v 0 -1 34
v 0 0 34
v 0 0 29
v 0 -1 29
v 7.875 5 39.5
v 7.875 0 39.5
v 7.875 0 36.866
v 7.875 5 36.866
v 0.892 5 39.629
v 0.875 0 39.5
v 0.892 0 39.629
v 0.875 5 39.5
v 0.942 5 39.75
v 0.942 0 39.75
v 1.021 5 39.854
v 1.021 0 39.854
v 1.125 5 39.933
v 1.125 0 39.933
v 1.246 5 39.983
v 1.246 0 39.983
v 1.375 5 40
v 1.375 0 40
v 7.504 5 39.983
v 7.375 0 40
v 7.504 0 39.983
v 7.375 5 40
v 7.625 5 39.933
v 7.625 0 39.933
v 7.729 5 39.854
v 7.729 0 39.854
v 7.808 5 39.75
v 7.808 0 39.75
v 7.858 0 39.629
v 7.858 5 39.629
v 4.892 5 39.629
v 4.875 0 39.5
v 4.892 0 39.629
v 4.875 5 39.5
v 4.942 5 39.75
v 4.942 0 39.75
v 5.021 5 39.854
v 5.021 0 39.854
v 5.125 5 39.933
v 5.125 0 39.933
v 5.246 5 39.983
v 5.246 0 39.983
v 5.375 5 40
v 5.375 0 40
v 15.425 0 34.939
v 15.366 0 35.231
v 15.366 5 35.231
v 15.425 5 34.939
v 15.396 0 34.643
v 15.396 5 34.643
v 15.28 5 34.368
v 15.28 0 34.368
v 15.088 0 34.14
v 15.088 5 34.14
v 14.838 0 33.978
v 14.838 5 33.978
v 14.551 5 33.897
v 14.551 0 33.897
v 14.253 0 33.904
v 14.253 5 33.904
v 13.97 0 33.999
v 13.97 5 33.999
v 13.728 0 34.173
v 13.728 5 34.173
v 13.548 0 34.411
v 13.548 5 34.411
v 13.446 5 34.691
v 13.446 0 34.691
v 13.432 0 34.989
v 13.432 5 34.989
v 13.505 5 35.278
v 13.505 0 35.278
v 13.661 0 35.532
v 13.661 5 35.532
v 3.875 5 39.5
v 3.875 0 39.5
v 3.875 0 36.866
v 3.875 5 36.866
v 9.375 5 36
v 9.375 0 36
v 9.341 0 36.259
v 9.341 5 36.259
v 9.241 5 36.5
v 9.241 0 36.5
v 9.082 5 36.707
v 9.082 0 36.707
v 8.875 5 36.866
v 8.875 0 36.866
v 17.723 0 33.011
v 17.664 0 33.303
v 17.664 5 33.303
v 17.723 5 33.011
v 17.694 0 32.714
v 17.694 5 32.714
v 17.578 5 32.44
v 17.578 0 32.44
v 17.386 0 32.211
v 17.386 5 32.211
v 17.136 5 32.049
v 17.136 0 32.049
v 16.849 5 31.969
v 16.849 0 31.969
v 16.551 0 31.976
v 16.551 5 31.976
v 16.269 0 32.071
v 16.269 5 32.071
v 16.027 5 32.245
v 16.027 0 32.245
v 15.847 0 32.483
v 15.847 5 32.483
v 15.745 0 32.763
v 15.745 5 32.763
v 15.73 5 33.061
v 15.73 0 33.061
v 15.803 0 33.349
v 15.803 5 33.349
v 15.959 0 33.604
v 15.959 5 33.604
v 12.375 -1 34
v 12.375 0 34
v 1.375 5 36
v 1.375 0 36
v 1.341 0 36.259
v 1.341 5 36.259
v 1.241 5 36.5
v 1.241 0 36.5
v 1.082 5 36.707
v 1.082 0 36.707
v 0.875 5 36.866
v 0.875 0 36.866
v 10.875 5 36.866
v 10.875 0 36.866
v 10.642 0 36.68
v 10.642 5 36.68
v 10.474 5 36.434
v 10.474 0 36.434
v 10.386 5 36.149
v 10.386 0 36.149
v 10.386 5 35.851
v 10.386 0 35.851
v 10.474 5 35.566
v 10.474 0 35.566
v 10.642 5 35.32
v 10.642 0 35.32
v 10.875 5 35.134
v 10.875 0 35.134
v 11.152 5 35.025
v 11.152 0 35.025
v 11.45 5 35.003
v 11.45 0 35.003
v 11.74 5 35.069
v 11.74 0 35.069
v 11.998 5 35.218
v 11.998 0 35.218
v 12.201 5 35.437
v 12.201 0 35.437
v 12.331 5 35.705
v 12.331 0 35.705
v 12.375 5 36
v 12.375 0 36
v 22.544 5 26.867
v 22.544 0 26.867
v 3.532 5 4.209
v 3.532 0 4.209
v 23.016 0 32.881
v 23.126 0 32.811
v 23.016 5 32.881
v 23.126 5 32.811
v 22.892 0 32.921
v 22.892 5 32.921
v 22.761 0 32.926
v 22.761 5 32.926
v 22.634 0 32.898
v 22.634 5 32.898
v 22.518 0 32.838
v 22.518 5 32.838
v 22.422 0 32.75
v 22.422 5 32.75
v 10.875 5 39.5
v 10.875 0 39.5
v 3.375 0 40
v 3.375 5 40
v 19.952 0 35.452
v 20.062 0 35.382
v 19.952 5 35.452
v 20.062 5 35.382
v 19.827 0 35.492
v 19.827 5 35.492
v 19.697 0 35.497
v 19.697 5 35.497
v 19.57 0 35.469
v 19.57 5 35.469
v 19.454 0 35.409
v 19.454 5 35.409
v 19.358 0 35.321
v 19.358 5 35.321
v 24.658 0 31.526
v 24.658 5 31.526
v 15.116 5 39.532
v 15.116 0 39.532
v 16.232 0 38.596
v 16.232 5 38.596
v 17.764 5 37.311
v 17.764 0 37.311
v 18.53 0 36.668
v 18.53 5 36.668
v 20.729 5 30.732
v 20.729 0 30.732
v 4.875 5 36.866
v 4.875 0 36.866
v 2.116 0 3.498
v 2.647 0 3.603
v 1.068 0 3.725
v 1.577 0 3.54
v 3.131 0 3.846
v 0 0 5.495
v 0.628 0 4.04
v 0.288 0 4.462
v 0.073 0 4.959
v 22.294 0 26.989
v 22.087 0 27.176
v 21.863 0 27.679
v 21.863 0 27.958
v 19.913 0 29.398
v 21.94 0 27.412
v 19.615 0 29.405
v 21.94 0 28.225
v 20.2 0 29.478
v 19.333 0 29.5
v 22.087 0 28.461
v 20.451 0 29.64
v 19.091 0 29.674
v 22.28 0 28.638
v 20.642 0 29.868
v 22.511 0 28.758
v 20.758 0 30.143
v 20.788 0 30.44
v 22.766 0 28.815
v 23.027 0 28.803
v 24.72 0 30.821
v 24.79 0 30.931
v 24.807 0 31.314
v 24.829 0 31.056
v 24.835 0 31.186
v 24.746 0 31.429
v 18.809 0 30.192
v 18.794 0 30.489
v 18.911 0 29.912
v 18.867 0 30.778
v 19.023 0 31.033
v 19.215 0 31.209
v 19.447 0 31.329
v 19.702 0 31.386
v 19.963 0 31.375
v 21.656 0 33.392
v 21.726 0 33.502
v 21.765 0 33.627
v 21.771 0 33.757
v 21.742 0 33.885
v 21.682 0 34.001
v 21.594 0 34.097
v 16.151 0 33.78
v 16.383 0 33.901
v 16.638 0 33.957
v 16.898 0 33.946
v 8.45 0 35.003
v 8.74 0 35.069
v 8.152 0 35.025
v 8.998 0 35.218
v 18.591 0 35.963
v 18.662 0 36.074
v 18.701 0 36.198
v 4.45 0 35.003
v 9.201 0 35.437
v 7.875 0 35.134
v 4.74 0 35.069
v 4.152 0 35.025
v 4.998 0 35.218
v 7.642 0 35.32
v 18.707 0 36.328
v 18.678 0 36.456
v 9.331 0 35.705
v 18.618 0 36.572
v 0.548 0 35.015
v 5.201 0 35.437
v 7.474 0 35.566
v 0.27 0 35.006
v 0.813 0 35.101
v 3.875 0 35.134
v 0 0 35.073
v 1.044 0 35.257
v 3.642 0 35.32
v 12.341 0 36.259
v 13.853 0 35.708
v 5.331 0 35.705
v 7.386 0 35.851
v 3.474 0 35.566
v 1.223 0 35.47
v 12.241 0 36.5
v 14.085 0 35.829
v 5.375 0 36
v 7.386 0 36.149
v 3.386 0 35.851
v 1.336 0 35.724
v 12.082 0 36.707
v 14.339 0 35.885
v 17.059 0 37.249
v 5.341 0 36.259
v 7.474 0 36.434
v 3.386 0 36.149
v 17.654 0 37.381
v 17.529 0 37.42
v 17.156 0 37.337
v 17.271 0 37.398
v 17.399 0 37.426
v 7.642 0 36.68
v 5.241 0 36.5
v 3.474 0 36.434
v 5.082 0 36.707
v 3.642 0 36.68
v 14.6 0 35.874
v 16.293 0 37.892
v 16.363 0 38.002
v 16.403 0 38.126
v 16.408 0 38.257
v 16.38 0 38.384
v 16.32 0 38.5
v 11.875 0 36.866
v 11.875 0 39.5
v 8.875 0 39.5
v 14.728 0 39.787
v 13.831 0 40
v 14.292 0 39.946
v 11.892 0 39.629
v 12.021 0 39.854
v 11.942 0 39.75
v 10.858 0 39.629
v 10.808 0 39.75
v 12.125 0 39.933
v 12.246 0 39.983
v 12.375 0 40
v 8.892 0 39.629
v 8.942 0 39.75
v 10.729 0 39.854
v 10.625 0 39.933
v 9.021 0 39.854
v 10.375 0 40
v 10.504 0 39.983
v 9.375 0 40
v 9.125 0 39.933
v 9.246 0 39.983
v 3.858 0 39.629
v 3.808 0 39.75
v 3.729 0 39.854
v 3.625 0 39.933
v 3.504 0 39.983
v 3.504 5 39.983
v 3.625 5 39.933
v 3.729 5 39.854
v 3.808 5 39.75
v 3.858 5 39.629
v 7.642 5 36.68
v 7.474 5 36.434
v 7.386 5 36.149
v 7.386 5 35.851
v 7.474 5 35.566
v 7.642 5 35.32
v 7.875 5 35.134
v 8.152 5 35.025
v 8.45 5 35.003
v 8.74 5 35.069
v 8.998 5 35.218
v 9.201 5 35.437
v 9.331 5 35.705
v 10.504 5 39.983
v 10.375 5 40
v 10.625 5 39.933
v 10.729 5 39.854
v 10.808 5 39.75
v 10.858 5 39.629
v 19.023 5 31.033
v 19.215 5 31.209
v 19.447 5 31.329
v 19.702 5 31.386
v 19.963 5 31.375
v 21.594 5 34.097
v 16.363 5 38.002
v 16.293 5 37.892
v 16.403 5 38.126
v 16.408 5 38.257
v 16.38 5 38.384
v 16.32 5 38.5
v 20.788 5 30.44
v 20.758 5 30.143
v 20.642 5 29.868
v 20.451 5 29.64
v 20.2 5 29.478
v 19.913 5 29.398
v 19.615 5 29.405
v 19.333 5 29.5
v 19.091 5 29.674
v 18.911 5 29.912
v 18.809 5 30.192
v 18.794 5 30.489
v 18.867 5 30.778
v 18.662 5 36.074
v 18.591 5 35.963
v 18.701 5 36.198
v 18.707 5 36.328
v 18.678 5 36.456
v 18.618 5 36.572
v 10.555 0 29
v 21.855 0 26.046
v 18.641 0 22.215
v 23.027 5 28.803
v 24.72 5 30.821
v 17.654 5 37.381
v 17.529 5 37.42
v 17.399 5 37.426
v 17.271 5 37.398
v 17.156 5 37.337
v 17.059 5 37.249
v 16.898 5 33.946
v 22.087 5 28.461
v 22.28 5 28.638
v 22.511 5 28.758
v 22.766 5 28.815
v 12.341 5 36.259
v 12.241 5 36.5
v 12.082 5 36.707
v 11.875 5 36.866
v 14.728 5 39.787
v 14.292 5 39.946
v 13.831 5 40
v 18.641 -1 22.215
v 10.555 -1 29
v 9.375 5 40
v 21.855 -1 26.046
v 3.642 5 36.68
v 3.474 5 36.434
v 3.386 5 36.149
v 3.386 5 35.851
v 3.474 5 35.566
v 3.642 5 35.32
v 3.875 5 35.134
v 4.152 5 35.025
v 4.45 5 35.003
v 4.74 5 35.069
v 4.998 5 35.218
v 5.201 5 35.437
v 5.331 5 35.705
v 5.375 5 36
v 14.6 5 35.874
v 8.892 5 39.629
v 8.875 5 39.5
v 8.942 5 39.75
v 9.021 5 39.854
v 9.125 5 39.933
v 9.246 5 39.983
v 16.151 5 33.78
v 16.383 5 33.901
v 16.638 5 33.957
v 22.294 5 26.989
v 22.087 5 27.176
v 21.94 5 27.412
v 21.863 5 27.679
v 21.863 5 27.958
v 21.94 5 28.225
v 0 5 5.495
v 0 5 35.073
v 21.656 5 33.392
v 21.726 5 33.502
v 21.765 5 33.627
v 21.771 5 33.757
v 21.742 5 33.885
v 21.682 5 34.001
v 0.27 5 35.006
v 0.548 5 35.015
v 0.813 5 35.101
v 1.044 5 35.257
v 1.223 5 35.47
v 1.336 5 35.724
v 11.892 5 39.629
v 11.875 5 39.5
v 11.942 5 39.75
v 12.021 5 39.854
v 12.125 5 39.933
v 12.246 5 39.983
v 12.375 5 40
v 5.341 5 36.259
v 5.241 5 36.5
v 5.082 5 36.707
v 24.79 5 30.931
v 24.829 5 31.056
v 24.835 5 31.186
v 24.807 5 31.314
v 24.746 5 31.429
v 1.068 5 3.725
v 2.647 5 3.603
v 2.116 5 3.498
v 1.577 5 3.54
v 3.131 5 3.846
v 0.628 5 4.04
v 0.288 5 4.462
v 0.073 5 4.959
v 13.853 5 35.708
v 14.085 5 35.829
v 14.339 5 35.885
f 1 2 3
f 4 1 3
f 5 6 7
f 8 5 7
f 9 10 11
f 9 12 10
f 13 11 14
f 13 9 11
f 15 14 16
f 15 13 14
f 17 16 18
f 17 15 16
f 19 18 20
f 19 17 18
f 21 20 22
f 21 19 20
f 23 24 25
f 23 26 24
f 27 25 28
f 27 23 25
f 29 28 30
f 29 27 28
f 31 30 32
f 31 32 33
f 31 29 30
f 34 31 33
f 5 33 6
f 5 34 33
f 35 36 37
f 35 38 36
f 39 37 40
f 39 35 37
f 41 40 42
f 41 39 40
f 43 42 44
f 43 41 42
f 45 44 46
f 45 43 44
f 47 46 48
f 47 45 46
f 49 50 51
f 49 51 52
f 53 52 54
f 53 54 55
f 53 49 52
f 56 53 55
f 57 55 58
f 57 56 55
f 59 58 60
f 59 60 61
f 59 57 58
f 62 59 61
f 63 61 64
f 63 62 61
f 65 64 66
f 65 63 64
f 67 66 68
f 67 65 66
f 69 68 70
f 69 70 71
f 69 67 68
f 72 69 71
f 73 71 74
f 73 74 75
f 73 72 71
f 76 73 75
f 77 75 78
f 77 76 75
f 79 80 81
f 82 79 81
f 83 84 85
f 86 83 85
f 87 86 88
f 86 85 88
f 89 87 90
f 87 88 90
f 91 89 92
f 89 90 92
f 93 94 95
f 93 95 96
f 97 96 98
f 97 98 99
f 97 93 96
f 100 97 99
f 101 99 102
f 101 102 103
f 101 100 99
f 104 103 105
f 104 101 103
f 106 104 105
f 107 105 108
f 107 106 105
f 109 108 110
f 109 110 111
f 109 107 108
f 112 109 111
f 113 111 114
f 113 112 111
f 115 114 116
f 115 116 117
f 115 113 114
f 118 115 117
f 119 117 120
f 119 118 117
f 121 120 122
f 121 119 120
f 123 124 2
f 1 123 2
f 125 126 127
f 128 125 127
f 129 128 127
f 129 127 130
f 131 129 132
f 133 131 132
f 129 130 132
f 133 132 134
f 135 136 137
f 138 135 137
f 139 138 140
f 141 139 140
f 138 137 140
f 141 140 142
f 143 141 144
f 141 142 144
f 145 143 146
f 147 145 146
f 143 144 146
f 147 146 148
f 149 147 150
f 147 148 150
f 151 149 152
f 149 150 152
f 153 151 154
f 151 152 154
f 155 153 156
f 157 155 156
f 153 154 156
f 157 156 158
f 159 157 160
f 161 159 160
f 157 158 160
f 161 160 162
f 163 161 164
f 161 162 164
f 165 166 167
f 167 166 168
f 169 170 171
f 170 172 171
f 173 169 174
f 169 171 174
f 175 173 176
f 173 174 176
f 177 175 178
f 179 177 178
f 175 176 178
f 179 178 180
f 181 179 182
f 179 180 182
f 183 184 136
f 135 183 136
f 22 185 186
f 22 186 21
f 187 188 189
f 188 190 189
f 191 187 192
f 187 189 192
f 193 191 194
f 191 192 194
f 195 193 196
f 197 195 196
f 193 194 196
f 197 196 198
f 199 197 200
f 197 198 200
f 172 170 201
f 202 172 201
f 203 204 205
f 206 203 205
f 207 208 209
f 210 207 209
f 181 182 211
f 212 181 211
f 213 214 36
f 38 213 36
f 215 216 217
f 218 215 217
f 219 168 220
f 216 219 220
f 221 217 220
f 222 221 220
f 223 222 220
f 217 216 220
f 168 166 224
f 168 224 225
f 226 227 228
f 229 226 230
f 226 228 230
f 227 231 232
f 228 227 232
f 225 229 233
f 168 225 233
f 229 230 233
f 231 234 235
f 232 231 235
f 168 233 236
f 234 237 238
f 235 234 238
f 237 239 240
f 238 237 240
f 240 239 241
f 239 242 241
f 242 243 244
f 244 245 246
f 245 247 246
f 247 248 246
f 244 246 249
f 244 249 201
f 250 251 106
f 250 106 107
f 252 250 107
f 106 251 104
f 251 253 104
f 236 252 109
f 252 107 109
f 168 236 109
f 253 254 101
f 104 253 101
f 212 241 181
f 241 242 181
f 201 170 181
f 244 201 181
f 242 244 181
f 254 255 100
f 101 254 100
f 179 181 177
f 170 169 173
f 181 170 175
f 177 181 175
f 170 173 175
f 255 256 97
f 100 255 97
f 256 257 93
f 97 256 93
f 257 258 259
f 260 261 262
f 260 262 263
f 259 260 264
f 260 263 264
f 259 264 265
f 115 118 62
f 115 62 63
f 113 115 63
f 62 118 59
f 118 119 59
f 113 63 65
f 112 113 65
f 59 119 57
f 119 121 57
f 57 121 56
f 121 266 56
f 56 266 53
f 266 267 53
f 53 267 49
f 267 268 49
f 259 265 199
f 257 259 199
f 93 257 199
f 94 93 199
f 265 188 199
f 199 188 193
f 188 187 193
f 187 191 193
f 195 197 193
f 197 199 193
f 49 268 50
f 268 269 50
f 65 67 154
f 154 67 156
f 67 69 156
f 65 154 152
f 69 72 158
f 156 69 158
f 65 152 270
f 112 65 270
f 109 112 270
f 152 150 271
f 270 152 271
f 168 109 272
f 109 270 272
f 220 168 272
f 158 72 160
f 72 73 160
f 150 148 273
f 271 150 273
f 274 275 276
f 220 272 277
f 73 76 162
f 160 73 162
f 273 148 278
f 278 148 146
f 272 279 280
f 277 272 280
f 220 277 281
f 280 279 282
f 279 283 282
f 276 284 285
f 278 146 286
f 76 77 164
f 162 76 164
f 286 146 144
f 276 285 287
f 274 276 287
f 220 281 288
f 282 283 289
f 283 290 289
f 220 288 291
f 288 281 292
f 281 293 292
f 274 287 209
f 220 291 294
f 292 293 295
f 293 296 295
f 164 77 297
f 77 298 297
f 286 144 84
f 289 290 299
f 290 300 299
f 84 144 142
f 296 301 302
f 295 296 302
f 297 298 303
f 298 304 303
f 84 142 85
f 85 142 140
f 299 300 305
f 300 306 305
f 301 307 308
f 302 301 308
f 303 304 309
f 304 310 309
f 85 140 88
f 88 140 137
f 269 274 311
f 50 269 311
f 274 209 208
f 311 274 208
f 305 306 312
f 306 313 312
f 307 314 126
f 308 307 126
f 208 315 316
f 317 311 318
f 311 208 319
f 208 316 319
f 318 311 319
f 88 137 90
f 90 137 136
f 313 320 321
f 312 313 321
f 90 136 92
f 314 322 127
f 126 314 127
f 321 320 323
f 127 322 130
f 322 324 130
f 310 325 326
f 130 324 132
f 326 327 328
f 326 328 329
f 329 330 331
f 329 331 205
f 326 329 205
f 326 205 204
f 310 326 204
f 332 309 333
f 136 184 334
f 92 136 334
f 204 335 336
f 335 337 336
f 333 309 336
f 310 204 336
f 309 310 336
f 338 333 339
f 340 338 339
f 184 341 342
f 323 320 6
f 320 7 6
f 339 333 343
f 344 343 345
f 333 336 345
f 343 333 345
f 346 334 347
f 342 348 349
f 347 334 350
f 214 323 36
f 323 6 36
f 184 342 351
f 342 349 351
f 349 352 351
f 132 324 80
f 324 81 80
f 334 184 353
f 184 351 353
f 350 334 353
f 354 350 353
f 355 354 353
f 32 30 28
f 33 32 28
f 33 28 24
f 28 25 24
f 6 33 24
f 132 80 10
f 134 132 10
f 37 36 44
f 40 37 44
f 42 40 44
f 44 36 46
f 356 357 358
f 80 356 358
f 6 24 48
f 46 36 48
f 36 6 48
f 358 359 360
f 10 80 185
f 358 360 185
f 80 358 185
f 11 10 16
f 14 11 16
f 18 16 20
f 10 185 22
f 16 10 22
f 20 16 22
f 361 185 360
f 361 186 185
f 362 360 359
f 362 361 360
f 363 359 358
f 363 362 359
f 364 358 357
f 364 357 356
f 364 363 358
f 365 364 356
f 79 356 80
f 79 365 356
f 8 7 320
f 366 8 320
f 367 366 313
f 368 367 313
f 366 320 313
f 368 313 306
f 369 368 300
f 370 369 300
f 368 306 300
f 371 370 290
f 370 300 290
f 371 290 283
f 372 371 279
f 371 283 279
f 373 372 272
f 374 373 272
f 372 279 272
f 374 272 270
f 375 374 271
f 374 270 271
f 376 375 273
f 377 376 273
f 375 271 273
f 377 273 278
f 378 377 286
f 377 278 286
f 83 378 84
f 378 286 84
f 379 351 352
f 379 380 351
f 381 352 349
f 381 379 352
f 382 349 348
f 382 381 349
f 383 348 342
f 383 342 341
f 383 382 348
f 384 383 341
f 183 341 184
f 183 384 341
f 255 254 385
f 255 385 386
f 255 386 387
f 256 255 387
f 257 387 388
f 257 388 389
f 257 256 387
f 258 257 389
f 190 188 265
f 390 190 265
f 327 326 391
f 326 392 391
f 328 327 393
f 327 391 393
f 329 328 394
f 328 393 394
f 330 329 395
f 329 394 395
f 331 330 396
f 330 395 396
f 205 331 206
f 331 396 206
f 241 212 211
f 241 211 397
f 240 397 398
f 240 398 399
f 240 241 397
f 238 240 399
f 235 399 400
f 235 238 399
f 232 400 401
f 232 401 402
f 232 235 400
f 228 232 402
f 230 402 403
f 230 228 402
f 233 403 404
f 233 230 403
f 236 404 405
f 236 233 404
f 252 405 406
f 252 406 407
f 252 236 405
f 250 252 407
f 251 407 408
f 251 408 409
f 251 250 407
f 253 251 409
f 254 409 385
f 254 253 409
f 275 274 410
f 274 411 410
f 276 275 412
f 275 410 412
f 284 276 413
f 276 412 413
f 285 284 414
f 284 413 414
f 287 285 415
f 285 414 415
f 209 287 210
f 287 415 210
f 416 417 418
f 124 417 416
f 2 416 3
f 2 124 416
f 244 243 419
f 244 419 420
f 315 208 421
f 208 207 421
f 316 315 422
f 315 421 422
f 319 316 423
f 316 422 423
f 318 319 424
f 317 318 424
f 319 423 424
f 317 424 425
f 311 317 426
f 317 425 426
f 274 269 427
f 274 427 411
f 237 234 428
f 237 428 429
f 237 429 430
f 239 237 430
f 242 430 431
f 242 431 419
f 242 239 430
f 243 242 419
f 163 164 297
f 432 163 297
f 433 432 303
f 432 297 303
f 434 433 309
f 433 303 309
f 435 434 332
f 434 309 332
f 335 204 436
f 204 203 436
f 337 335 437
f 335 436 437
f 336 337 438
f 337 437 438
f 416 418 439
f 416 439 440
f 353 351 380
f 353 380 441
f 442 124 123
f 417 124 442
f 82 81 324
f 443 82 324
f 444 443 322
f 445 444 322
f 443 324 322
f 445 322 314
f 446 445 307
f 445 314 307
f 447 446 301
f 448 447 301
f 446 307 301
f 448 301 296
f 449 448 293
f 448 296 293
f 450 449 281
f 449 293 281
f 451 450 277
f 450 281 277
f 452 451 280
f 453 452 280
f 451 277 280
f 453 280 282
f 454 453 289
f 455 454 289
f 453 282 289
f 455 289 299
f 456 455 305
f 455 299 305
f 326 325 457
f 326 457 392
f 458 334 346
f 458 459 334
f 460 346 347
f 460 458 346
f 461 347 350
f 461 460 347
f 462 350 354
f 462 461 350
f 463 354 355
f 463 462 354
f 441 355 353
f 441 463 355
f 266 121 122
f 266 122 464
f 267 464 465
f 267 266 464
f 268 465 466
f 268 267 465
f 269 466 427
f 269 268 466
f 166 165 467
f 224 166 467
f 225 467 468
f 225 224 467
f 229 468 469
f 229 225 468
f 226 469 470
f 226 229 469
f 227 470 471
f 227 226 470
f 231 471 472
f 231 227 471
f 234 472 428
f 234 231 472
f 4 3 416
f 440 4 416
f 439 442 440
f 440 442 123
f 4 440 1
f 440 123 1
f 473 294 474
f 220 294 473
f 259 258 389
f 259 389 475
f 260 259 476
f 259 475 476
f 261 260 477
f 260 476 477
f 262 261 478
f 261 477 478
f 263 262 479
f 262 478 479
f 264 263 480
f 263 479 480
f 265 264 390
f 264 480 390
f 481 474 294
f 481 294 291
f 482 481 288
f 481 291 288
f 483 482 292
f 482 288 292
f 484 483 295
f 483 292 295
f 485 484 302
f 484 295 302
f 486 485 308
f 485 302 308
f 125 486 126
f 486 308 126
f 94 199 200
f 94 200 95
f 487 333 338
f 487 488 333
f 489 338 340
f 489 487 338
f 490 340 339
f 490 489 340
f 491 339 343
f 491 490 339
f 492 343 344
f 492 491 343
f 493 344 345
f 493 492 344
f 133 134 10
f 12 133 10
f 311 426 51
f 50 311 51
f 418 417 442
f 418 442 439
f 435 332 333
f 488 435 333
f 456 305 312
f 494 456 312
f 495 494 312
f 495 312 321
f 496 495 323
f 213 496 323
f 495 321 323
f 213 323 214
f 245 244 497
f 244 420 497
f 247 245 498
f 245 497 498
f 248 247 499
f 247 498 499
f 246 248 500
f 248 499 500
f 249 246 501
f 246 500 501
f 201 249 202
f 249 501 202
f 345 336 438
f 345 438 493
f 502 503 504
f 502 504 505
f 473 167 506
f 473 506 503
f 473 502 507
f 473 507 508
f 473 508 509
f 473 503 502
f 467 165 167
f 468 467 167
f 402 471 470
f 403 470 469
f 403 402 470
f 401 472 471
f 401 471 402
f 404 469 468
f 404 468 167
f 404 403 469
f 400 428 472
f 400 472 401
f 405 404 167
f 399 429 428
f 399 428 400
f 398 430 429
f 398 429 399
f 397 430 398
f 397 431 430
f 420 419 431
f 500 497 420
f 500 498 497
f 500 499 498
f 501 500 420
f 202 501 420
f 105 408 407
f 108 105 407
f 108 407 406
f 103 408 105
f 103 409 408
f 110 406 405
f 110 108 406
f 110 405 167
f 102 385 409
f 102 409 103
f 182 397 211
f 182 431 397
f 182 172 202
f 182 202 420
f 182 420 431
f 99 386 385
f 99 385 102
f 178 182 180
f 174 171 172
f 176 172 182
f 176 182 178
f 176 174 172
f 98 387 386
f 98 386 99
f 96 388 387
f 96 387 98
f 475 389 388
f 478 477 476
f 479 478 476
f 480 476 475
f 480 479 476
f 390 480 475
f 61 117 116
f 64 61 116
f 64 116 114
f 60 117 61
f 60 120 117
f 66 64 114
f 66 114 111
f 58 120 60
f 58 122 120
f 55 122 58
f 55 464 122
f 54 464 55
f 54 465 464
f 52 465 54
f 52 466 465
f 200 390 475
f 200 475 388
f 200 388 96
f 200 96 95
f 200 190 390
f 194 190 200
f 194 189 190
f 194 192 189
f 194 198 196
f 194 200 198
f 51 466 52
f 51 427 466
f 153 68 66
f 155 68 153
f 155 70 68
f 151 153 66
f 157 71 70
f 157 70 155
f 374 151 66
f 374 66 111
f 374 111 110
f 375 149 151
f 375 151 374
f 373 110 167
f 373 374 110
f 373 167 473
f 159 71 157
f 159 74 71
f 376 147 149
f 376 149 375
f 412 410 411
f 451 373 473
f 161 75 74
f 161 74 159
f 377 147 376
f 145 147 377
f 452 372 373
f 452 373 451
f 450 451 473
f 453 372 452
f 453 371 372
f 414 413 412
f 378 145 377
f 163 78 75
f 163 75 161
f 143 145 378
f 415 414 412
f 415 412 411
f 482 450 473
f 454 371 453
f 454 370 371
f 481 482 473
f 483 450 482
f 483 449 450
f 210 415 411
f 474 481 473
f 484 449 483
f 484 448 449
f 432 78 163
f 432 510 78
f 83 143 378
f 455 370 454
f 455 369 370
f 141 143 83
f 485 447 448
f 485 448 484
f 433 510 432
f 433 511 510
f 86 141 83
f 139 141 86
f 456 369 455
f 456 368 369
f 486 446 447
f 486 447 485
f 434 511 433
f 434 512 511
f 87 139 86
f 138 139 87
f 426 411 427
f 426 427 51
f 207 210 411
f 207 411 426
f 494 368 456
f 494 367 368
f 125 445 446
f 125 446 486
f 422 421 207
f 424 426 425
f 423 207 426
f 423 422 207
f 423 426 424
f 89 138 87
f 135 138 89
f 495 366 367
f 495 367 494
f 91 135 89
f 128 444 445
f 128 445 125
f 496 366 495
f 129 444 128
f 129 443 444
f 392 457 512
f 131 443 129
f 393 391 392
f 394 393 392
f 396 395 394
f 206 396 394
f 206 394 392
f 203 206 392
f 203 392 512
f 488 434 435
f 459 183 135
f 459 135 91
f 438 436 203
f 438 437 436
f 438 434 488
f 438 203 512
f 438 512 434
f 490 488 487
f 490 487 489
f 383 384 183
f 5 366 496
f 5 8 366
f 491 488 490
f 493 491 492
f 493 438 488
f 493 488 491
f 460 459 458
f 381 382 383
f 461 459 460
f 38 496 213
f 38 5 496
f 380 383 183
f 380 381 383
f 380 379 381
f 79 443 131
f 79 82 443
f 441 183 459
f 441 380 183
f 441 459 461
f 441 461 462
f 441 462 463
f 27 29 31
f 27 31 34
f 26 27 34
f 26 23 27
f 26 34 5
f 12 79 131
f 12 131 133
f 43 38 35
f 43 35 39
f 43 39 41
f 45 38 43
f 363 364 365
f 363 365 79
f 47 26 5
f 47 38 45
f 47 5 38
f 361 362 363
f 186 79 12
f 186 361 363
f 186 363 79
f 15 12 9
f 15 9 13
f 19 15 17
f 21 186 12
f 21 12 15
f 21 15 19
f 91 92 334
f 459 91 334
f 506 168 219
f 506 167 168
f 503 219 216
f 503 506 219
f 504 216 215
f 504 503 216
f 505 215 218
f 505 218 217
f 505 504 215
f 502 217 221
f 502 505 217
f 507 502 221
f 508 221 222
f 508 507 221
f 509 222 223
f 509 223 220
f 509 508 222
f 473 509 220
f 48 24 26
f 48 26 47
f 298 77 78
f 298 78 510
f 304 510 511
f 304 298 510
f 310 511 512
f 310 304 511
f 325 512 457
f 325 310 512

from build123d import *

# Parameters (mm, degrees)
F2_DEPTH = 5
F3_DEPTH = 1
F4_DEPTH = 5
F5_R     = 0.5
F8_R     = 2


with BuildPart() as f2:
    # F0 (on Front) → F2 (new body)
    with BuildSketch(Plane.XZ):
        Polygon((0, 29), (0, 0), (10.5551367937, 29), align=None)
        Polygon((0, 34), (0, 29), (10.5551367937, 29), (12.3749879651, 34), align=None)
        Polygon((12.3749879651, 34), (14.5588093706, 40), (0, 40), (0, 34), align=None)
    extrude(amount=-F2_DEPTH)

    # F1 (on Front) → F4 (cut, through all)
    with BuildSketch(Plane.XZ):
        with BuildLine():
            ThreePointArc((-0.1250120349, 36.8660254038), (-0.1250120349, 35.1339745962), (1.3749879651, 36))
            ThreePointArc((1.3749879651, 36), (1.2410133688, 36.5), (0.8749879651, 36.8660254038))
            ThreePointArc((0.8749879651, 36.8660254038), (0.3749879651, 37), (-0.1250120349, 36.8660254038))
        make_face()
        with BuildLine():
            ThreePointArc((-0.1250120349, 36.8660254038), (0.3749879651, 37), (0.8749879651, 36.8660254038))
            Line((0.8749879651, 36.8660254038), (0.8749879651, 40))
            Line((0.8749879651, 40), (-0.1250120349, 40))
            Line((-0.1250120349, 40), (-0.1250120349, 36.8660254038))
        make_face()
        with BuildLine():
            ThreePointArc((3.8749879651, 36.8660254038), (3.8749879651, 35.1339745962), (5.3749879651, 36))
            ThreePointArc((5.3749879651, 36), (5.2410133688, 36.5), (4.8749879651, 36.8660254038))
            ThreePointArc((4.8749879651, 36.8660254038), (4.3749879651, 37), (3.8749879651, 36.8660254038))
        make_face()
        with BuildLine():
            ThreePointArc((3.8749879651, 36.8660254038), (4.3749879651, 37), (4.8749879651, 36.8660254038))
            Line((4.8749879651, 36.8660254038), (4.8749879651, 40))
            Line((4.8749879651, 40), (3.8749879651, 40))
            Line((3.8749879651, 40), (3.8749879651, 36.8660254038))
        make_face()
        with BuildLine():
            ThreePointArc((10.8749879651, 36.8660254038), (10.8749879651, 35.1339745962), (12.3749879651, 36))
            ThreePointArc((12.3749879651, 36), (12.2410133688, 36.5), (11.8749879651, 36.8660254038))
            ThreePointArc((11.8749879651, 36.8660254038), (11.3749879651, 37), (10.8749879651, 36.8660254038))
        make_face()
        with BuildLine():
            ThreePointArc((7.8749879651, 36.8660254038), (7.8749879651, 35.1339745962), (9.3749879651, 36))
            ThreePointArc((9.3749879651, 36), (9.2410133688, 36.5), (8.8749879651, 36.8660254038))
            ThreePointArc((8.8749879651, 36.8660254038), (8.3749879651, 37), (7.8749879651, 36.8660254038))
        make_face()
        with BuildLine():
            ThreePointArc((7.8749879651, 36.8660254038), (8.3749879651, 37), (8.8749879651, 36.8660254038))
            Line((8.8749879651, 36.8660254038), (8.8749879651, 40))
            Line((8.8749879651, 40), (7.8749879651, 40))
            Line((7.8749879651, 40), (7.8749879651, 36.8660254038))
        make_face()
        with BuildLine():
            ThreePointArc((10.8749879651, 36.8660254038), (11.3749879651, 37), (11.8749879651, 36.8660254038))
            Line((11.8749879651, 36.8660254038), (11.8749879651, 40))
            Line((11.8749879651, 40), (10.8749879651, 40))
            Line((10.8749879651, 40), (10.8749879651, 36.8660254038))
        make_face()
    extrude(amount=-F4_DEPTH, mode=Mode.SUBTRACT)

    # F5
    f5_edges = [f2.edges().sort_by_distance(p)[0] for p in [
        (0.874988, 2.5, 40),
        (3.874988, 2.5, 40),
        (4.874988, 2.5, 40),
        (11.874988, 2.5, 40),
        (10.874988, 2.5, 40),
        (7.874988, 2.5, 40),
        (8.874988, 2.5, 40),
    ]]
    fillet(f5_edges, radius=F5_R)

    # F6: F2 across face


with BuildPart() as f3:
    # F0 (on Front) → F3 (new body)
    with BuildSketch(Plane.XZ):
        Polygon((0, 34), (0, 29), (10.5551367937, 29), (12.3749879651, 34), align=None)
    extrude(amount=F3_DEPTH)

    # F7: F3 across face


with BuildPart() as f2_1:
    add(f2.part)
    add(f2.part.mirror(Plane(origin=(7.2794046853, 2.5, 20), x_dir=(0, 1, 0), z_dir=(0.9396926208, 0, -0.3420201433))))

    # F8
    f8_edges = [f2_1.edges().sort_by_distance(p)[0] for p in [
        (14.558809, 2.5, 40),
        (0, 2.5, 0),
    ]]
    fillet(f8_edges, radius=F8_R)


with BuildPart() as f3_1:
    add(f3.part)
    add(f3.part.mirror(Plane(origin=(11.4650623794, -0.5, 31.5), x_dir=(0, 1, 0), z_dir=(0.9396926208, 0, -0.3420201433))))


solid = Compound([f2_1.part, f3_1.part])
